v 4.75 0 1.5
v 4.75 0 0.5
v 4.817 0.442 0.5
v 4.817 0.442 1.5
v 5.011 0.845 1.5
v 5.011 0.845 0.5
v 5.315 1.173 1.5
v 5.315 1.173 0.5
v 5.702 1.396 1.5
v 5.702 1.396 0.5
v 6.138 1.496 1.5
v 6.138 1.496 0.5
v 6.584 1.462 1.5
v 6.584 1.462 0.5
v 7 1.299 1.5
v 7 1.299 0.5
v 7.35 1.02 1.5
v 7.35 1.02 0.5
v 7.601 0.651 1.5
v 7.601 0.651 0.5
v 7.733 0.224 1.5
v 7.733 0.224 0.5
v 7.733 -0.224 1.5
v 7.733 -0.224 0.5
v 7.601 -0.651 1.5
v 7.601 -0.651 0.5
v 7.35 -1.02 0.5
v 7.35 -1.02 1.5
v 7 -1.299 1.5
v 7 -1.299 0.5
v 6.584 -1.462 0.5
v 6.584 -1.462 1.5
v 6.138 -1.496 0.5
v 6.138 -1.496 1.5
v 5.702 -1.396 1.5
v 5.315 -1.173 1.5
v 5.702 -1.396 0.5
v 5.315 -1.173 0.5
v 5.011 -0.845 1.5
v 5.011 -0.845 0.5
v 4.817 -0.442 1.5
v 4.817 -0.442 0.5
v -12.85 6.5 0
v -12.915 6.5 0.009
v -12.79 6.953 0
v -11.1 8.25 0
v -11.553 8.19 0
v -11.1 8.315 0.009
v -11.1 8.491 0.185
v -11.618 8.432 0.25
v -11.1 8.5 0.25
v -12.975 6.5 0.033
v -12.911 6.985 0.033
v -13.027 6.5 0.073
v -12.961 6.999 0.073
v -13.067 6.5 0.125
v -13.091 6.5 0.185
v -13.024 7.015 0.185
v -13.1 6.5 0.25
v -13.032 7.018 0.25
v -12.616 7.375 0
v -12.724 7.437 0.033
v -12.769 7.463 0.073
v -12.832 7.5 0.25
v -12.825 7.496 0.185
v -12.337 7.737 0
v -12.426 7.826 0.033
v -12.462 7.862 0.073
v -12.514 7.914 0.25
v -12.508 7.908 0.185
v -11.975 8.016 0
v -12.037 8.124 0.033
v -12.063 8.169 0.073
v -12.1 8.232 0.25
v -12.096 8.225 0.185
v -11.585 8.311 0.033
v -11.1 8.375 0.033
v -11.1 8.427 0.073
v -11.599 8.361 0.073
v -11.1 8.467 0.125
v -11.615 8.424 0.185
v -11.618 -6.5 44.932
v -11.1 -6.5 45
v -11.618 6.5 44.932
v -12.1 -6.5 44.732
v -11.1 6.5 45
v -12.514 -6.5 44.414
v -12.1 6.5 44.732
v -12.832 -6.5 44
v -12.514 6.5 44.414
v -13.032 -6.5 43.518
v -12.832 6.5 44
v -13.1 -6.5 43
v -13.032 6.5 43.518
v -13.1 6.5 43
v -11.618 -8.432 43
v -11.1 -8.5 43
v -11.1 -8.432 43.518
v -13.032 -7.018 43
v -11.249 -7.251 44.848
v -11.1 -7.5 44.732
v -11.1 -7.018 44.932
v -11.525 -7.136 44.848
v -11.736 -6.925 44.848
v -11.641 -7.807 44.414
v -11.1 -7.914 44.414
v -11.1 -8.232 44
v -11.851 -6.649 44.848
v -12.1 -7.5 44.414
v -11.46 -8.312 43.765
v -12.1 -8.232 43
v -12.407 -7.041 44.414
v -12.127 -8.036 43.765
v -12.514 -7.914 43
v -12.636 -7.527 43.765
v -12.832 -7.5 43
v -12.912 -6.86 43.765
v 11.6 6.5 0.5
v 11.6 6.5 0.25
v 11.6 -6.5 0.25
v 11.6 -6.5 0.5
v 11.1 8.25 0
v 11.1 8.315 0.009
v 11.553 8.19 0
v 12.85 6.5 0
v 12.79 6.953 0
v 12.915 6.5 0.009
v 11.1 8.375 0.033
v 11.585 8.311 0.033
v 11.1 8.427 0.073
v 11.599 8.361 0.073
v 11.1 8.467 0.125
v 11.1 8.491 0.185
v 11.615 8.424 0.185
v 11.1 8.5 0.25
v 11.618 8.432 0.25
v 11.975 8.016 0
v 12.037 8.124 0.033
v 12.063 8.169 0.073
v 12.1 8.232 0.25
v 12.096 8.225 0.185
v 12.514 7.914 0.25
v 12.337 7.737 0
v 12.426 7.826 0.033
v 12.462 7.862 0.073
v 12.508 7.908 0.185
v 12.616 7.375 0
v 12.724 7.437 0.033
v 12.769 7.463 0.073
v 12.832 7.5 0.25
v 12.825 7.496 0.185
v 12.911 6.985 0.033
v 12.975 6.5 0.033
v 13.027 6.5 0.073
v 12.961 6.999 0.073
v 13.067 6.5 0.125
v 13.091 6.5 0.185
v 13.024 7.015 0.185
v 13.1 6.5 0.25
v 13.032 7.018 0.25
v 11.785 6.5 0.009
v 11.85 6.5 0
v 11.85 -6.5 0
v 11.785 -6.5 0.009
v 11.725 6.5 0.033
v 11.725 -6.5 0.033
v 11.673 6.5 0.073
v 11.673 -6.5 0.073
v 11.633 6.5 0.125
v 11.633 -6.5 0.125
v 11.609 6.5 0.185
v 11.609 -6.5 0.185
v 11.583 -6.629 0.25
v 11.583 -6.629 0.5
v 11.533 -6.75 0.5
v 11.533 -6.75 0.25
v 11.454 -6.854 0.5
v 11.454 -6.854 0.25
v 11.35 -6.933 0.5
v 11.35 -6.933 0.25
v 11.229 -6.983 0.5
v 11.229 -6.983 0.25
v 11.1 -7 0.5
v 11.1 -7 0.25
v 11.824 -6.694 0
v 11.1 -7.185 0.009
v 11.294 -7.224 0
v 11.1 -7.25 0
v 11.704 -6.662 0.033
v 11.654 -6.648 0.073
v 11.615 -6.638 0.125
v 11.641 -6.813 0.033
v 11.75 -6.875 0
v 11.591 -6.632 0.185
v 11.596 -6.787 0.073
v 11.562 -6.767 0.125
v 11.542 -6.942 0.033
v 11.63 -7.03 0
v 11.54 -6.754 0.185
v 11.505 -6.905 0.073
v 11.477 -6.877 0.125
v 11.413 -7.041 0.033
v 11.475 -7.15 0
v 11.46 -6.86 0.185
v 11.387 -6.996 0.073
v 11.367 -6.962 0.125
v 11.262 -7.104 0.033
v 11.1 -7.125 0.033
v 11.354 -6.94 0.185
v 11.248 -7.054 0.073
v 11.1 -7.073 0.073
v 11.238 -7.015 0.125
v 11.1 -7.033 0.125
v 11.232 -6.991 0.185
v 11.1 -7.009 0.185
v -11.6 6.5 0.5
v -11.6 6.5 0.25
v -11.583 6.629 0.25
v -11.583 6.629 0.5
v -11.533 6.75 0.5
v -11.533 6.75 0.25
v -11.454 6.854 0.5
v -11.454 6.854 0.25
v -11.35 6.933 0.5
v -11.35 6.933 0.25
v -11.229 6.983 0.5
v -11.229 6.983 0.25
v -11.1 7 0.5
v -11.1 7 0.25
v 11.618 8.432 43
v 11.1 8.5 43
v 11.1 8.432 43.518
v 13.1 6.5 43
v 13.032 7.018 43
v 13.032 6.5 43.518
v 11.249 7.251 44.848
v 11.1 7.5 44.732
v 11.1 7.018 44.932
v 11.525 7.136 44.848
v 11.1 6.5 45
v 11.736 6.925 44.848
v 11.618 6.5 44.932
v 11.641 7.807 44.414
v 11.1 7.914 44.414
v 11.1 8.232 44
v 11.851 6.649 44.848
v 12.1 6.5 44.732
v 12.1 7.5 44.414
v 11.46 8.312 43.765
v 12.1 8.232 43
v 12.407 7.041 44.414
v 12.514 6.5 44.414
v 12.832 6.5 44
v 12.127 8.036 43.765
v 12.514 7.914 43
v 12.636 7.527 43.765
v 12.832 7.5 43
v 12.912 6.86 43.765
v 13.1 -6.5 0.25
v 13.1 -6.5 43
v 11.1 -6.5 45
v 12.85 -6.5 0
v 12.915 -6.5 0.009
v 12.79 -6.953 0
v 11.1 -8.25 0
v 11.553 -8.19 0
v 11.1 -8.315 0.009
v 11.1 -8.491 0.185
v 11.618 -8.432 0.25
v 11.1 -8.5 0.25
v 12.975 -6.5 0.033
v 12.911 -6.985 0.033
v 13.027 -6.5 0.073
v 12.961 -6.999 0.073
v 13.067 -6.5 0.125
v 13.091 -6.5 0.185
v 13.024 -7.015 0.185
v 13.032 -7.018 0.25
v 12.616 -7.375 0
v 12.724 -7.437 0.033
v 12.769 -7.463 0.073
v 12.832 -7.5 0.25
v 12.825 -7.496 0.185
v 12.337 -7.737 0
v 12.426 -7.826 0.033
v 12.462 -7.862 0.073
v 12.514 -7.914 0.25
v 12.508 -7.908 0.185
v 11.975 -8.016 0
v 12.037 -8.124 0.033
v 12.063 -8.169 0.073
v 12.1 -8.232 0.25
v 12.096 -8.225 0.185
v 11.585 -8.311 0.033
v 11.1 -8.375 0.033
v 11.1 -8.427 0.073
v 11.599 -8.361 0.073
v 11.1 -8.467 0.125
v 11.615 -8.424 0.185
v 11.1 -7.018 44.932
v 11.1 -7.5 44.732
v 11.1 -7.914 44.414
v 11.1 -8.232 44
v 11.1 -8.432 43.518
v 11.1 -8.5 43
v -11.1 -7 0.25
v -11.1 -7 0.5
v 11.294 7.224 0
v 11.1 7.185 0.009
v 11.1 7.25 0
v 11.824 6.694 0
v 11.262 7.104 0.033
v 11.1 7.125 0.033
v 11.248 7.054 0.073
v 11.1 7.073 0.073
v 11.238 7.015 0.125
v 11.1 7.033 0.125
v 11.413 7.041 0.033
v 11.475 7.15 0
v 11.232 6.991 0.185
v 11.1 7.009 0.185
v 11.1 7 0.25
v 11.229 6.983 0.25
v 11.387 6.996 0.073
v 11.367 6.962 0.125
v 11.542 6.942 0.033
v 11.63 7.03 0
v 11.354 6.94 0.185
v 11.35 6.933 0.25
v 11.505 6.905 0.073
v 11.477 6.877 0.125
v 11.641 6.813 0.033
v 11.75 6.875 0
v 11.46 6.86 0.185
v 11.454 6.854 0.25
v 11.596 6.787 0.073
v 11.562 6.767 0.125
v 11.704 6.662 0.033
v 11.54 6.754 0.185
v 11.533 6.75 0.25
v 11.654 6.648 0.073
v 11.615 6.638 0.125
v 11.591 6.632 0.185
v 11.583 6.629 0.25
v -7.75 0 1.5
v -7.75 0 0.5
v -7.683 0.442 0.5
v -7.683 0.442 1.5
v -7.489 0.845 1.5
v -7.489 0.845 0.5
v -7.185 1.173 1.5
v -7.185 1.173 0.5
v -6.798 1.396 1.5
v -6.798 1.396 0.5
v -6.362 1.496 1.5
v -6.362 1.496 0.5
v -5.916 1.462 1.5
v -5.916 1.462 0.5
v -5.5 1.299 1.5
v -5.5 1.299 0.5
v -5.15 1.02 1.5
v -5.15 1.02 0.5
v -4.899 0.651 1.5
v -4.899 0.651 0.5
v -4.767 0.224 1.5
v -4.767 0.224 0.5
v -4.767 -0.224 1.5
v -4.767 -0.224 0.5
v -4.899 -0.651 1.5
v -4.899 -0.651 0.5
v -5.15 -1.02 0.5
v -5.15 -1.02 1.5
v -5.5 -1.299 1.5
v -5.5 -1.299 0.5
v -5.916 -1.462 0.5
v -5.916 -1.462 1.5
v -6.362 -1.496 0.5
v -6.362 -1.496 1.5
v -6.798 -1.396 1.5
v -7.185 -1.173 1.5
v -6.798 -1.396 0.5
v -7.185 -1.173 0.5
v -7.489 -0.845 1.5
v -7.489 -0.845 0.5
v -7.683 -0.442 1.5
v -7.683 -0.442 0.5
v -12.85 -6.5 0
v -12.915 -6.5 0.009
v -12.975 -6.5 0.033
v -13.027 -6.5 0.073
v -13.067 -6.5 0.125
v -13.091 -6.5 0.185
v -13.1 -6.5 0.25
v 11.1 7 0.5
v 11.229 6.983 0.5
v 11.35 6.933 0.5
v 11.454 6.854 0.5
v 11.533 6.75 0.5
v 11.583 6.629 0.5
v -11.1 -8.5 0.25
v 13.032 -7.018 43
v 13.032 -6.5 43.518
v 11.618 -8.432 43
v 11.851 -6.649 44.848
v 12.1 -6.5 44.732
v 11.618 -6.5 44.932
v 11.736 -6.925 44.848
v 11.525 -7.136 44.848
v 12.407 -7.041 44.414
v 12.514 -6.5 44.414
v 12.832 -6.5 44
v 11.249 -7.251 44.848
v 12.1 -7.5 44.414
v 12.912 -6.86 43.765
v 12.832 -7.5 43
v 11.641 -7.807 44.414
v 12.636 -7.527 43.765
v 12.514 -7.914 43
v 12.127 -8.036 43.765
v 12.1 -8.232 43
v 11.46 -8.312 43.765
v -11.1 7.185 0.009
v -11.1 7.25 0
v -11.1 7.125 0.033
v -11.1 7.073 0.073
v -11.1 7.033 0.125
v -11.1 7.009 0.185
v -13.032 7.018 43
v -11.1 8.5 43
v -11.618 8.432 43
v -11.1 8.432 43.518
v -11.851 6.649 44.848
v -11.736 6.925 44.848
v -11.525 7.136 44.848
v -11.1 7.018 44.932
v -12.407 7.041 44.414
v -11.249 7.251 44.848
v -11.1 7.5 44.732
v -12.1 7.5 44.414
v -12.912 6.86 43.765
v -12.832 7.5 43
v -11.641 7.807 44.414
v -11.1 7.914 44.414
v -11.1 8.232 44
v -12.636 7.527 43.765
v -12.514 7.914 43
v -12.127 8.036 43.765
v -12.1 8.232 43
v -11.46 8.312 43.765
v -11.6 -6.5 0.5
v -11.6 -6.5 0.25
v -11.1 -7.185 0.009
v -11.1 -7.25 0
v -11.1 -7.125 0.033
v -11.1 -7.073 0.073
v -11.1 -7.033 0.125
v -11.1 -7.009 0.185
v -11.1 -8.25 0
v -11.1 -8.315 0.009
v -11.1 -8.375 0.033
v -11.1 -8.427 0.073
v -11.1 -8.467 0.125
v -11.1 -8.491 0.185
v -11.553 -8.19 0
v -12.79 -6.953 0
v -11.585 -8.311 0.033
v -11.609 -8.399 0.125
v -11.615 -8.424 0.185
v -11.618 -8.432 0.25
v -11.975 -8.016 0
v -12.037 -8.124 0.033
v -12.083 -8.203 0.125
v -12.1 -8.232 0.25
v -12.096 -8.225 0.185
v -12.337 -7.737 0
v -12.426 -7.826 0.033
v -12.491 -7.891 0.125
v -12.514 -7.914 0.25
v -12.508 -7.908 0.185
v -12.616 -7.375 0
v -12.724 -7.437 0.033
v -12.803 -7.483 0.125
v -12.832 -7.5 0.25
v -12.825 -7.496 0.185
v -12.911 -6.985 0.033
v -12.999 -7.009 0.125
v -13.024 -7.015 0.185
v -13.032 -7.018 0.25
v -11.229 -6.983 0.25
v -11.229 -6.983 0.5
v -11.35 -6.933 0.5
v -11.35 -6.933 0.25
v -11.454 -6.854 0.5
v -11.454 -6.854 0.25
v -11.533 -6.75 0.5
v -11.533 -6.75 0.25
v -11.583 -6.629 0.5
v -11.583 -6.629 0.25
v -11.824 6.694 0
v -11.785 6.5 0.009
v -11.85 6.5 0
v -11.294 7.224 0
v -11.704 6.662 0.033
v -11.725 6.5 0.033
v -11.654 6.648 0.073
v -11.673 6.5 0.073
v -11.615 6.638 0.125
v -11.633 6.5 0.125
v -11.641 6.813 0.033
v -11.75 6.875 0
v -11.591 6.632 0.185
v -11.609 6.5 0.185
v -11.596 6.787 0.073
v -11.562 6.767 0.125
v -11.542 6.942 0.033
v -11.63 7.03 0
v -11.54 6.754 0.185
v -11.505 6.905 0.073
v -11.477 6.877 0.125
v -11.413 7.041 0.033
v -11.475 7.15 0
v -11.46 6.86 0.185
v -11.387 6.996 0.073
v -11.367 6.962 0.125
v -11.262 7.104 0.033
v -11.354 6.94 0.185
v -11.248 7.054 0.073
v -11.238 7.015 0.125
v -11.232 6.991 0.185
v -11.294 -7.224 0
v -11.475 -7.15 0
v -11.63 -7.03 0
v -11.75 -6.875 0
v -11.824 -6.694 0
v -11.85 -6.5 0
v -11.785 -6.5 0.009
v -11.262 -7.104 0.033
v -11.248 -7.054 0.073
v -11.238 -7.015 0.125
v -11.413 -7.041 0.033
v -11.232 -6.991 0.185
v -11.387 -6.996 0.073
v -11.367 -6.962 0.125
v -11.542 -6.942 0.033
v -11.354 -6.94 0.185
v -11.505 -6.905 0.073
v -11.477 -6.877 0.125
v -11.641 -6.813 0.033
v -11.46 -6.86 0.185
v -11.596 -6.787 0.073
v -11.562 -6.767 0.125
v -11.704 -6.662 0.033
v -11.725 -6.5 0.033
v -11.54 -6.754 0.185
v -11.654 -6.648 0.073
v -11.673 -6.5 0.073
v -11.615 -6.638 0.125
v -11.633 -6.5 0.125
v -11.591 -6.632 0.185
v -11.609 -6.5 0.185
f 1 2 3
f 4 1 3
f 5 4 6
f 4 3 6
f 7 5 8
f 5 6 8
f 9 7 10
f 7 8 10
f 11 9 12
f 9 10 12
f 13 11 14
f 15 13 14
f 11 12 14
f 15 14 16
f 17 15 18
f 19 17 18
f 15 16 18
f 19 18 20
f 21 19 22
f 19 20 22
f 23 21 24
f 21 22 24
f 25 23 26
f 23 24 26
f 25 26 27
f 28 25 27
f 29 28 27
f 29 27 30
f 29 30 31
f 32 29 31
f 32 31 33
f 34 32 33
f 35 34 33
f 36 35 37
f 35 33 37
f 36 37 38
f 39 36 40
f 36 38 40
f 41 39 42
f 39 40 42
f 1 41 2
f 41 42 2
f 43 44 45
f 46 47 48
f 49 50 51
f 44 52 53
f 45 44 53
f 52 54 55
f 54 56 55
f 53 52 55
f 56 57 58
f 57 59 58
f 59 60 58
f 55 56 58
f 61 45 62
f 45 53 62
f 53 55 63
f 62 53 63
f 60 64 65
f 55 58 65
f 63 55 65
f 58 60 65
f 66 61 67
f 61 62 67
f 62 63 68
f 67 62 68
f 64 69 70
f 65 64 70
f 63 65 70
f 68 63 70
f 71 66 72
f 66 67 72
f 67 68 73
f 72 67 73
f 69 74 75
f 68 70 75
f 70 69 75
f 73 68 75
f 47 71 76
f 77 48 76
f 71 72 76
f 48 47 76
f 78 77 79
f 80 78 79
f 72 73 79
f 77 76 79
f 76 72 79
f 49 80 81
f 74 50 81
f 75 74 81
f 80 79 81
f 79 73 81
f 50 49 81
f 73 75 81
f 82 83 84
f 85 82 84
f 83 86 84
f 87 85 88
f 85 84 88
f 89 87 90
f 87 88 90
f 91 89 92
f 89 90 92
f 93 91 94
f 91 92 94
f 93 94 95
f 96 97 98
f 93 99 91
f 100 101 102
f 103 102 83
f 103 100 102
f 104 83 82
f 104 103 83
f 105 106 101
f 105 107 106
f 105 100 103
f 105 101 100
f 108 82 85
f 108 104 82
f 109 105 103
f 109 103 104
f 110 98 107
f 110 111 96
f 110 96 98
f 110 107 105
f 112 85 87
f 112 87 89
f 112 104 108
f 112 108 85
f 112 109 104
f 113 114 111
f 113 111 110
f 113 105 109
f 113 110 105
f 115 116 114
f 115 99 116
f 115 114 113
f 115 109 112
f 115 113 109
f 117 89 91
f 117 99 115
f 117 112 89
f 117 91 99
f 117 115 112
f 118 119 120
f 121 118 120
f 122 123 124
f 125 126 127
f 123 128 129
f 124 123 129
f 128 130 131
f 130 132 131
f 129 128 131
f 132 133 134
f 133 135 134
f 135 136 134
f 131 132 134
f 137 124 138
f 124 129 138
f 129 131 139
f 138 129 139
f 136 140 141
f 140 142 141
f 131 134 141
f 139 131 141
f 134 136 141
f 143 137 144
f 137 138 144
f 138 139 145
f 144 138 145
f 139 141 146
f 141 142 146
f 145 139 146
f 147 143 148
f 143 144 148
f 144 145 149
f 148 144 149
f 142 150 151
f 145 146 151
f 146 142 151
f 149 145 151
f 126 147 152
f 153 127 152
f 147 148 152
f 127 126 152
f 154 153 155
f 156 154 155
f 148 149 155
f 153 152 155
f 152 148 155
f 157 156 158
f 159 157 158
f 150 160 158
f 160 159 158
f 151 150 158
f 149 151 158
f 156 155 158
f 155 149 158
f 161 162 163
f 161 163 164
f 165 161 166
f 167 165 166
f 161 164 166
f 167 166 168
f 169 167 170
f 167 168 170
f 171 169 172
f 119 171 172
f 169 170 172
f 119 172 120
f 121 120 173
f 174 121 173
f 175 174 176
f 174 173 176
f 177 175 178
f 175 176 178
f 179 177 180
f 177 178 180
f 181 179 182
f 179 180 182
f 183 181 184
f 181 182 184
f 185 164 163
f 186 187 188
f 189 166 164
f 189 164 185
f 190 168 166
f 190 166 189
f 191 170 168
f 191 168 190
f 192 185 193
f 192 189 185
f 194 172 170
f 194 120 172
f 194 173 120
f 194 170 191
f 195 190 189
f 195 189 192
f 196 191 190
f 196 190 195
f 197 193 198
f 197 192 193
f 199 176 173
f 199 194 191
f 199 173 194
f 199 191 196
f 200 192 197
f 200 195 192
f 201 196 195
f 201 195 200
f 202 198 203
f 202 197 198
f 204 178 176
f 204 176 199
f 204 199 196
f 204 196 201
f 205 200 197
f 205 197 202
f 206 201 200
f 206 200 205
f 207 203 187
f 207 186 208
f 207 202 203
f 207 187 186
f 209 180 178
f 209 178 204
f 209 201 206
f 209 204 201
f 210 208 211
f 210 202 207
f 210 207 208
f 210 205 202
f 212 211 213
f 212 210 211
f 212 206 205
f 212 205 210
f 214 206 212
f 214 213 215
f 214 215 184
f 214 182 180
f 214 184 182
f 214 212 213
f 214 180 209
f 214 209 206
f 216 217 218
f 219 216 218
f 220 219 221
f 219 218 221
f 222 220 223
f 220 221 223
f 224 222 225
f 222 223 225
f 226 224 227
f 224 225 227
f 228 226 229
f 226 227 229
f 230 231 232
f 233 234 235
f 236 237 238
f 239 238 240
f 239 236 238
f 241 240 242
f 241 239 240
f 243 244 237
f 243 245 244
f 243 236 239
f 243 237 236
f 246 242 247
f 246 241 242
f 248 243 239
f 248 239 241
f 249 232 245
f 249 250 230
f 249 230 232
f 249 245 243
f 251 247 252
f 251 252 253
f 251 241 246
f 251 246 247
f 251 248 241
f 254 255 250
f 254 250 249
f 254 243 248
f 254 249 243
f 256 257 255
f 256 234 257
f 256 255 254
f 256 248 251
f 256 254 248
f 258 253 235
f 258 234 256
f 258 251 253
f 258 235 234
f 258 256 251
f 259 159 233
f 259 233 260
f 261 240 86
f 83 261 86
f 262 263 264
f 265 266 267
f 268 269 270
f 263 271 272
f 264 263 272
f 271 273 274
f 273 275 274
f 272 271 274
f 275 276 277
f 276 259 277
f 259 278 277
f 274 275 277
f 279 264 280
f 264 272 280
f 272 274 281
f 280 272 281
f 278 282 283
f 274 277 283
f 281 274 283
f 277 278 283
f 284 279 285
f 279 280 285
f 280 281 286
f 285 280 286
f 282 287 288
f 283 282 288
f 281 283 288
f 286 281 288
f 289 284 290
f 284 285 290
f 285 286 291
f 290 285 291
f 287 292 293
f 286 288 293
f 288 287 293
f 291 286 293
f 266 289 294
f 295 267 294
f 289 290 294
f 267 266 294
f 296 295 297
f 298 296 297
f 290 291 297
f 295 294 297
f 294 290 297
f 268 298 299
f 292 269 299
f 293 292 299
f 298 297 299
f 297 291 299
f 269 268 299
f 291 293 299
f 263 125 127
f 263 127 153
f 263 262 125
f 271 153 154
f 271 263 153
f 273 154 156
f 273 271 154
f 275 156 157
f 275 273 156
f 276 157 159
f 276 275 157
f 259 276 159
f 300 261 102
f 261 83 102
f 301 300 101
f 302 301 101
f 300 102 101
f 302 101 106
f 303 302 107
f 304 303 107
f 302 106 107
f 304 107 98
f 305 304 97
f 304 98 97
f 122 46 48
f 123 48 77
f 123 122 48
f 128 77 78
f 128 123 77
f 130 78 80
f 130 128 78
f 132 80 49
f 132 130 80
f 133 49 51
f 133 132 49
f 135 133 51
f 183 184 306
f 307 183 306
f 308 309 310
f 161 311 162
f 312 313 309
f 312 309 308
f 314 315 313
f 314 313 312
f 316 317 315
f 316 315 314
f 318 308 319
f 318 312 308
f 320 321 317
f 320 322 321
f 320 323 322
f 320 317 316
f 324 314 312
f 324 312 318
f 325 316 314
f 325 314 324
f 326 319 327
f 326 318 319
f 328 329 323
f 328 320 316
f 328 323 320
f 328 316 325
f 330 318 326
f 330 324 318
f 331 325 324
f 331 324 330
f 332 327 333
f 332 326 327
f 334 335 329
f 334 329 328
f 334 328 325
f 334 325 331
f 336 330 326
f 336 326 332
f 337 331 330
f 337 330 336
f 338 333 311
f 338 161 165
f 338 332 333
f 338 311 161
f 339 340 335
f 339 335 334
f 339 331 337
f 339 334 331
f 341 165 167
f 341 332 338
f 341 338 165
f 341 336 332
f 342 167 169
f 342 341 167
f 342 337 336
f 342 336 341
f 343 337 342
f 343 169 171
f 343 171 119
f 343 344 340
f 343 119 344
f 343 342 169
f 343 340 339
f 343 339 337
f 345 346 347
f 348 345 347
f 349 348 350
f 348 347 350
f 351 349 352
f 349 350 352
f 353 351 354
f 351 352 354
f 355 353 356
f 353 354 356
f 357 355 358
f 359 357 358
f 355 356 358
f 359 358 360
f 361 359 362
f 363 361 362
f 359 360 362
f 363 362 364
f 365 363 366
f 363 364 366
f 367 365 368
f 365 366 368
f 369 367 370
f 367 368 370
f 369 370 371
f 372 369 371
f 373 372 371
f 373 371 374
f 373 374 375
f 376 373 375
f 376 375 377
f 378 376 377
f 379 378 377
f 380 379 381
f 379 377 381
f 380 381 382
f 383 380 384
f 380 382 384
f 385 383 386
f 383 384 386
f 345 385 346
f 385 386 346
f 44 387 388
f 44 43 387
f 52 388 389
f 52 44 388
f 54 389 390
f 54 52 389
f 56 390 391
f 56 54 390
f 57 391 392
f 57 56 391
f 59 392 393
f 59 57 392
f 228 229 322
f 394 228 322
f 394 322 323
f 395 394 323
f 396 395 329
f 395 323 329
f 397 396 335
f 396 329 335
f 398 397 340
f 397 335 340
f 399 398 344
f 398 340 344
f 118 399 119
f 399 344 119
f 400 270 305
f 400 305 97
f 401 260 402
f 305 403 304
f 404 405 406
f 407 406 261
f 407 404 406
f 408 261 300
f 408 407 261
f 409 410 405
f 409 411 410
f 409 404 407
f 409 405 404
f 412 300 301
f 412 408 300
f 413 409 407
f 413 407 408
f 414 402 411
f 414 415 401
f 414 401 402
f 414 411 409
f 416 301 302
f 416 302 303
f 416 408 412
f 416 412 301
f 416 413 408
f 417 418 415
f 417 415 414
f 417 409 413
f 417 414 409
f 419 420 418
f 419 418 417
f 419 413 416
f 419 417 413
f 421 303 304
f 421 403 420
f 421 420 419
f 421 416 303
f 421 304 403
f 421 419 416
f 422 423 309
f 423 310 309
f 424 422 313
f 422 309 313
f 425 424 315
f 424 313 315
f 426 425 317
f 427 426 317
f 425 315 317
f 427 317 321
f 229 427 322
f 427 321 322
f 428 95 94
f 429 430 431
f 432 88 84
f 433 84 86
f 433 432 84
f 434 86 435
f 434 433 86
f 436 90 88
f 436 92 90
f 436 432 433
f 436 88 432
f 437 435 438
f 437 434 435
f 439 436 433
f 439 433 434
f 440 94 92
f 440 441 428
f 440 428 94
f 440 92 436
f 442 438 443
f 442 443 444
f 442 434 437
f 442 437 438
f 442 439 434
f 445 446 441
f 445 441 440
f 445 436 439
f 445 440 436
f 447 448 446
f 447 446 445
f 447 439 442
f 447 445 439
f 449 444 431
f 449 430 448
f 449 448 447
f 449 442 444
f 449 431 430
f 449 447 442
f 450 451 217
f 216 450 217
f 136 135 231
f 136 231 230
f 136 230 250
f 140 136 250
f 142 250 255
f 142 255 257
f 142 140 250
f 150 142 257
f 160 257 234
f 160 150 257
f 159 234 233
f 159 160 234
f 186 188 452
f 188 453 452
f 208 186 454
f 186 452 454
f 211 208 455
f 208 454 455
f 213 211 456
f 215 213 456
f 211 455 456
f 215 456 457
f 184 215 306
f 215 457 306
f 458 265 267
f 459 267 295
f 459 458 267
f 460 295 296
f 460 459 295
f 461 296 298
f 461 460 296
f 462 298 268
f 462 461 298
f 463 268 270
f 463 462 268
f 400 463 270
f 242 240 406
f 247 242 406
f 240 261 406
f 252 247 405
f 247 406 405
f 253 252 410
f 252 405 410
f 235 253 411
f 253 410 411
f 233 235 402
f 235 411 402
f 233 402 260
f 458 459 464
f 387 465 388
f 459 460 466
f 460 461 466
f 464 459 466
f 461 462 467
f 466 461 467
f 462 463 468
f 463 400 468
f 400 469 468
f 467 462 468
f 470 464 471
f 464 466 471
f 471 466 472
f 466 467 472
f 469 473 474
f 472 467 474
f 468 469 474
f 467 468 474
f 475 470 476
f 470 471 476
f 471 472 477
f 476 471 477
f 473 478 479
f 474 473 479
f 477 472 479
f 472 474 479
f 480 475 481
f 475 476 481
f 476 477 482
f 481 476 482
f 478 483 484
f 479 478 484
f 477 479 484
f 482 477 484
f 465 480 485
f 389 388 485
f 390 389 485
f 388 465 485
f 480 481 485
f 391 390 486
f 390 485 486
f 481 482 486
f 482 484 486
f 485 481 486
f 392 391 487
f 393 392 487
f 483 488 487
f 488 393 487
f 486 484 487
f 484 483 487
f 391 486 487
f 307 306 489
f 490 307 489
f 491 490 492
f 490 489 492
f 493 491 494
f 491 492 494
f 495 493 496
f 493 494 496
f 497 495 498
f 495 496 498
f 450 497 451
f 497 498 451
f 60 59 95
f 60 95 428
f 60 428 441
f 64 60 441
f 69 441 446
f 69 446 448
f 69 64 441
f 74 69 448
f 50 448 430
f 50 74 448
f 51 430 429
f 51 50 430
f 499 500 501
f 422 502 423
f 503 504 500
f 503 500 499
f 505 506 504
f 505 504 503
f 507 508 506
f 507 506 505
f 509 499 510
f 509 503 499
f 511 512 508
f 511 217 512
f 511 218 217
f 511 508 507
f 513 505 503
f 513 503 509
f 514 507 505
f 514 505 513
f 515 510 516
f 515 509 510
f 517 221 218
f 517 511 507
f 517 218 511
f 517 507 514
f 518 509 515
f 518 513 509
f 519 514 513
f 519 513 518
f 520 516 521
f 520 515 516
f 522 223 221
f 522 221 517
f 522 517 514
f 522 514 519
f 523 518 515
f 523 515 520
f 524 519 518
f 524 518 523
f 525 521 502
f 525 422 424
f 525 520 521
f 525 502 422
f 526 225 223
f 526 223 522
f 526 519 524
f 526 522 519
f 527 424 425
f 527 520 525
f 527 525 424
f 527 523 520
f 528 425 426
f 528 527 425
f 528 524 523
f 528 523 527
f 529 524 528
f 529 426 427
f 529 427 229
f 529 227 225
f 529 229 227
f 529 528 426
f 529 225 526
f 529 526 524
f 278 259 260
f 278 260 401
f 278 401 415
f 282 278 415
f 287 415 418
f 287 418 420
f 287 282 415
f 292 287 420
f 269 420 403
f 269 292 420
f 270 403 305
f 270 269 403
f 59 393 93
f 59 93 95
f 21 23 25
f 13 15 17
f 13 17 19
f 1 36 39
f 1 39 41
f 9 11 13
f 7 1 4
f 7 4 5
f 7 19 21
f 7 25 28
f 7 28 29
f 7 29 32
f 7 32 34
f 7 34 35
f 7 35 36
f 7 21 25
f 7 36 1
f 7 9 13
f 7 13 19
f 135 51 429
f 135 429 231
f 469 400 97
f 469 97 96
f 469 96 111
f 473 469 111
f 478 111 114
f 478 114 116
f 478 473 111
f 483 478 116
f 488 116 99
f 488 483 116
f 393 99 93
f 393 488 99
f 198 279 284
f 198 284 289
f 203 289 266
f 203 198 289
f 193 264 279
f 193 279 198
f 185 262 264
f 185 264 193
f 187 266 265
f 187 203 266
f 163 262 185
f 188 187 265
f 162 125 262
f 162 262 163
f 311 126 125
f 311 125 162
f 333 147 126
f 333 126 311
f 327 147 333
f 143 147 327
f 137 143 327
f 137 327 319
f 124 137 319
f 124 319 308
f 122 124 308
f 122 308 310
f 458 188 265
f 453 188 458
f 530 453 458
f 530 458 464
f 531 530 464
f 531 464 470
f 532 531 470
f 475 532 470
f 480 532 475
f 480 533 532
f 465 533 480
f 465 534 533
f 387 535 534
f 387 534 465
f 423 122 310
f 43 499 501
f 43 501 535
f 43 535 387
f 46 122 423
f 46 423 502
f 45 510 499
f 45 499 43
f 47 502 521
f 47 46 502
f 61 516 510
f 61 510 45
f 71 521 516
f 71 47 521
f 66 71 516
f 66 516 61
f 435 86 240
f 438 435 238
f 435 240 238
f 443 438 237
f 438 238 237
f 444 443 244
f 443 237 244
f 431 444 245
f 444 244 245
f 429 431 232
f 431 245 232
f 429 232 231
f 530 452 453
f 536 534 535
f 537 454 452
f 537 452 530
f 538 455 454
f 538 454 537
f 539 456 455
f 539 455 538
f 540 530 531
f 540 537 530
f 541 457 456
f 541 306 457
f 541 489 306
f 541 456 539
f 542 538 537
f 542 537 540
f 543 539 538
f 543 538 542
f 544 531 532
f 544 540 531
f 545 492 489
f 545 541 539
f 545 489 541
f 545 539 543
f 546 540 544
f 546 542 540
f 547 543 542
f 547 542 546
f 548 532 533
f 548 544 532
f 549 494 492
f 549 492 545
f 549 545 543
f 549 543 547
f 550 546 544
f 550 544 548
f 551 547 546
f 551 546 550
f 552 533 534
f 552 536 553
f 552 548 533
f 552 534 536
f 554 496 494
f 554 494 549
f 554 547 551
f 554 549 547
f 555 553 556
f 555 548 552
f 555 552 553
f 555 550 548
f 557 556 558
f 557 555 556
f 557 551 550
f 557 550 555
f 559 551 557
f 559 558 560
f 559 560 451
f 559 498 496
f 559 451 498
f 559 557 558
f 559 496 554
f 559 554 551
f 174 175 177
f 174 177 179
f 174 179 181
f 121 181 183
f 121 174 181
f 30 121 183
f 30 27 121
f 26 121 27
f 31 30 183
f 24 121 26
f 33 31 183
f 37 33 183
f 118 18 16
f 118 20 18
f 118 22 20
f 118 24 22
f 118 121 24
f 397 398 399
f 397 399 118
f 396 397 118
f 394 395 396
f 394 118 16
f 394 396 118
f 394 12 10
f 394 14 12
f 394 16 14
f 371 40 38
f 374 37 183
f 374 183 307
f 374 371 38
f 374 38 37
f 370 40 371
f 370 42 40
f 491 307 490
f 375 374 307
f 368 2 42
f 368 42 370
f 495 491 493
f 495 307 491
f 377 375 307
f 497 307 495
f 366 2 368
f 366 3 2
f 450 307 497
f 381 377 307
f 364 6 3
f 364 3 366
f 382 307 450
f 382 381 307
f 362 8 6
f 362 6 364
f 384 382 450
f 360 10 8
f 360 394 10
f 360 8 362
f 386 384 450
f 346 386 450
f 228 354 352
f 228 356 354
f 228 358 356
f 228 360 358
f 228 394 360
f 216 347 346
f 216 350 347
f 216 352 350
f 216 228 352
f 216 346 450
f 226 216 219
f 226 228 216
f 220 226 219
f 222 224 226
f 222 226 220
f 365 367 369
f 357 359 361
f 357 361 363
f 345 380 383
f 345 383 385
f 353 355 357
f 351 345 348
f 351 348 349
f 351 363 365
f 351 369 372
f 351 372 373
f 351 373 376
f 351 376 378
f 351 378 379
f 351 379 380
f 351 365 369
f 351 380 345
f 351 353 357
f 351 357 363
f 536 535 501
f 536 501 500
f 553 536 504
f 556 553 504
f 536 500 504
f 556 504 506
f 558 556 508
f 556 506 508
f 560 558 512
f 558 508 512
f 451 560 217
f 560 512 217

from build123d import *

# Parameters (mm, degrees)
BOSS_EXTRU_1_DEPTH      = 45
ENL_V_MAT_EXTRU_1_DEPTH = 0.5
CONG_1_R                = 0.25
CONG_2_R                = 2
ESQUISSE3_R             = 1.5
ENL_V_MAT_EXTRU_2_DEPTH = 1


with BuildPart() as part:
    # Esquisse1 → Boss.-Extru.1 (new body)
    with BuildSketch(Plane.XY):
        with BuildLine():
            Line((-11.1, 8.5), (11.1, 8.5))
            ThreePointArc((11.1, 8.5), (12.514213562, 7.914213562), (13.1, 6.5))
            Line((13.1, 6.5), (13.1, -6.5))
            ThreePointArc((13.1, -6.5), (12.514213562, -7.914213562), (11.1, -8.5))
            Line((11.1, -8.5), (-11.1, -8.5))
            ThreePointArc((-11.1, -8.5), (-12.514213562, -7.914213562), (-13.1, -6.5))
            Line((-13.1, -6.5), (-13.1, 6.5))
            ThreePointArc((-13.1, 6.5), (-12.514213562, 7.914213562), (-11.1, 8.5))
        make_face()
    extrude(amount=BOSS_EXTRU_1_DEPTH)

    # Esquisse2 → Enlèv. mat.-Extru.1 (cut)
    with BuildSketch(Plane(origin=(0, 0, 0), x_dir=(-1, 0, 0), z_dir=(0, 0, -1))):
        with BuildLine():
            Line((11.6, -6.5), (11.6, 6.5))
            ThreePointArc((11.6, 6.5), (11.453553391, 6.853553391), (11.1, 7))
            Line((11.1, 7), (-11.1, 7))
            ThreePointArc((-11.1, 7), (-11.453553391, 6.853553391), (-11.6, 6.5))
            Line((-11.6, 6.5), (-11.6, -6.5))
            ThreePointArc((-11.6, -6.5), (-11.453553391, -6.853553391), (-11.1, -7))
            Line((-11.1, -7), (11.1, -7))
            ThreePointArc((11.1, -7), (11.453553391, -6.853553391), (11.6, -6.5))
        make_face()
    extrude(amount=-ENL_V_MAT_EXTRU_1_DEPTH, mode=Mode.SUBTRACT)

    # Congé1
    cong_1_edges = [part.edges().sort_by_distance(p)[0] for p in [
        (-13.1, 0, 0),
        (-12.514213562, 7.914213562, 0),
        (-11.453553391, 6.853553391, 0),
        (0, 7, 0),
        (11.453553391, 6.853553391, 0),
        (11.6, 0, 0),
        (11.453553391, -6.853553391, 0),
        (0, -7, 0),
        (-11.453553391, -6.853553391, 0),
        (-11.6, 0, 0),
        (0, 8.5, 0),
        (12.514213562, 7.914213562, 0),
        (13.1, 0, 0),
        (12.514213562, -7.914213562, 0),
        (0, -8.5, 0),
        (-12.514213562, -7.914213562, 0),
    ]]
    fillet(cong_1_edges, radius=CONG_1_R)

    # Congé2
    cong_2_edges = [part.edges().sort_by_distance(p)[0] for p in [
        (-12.514213562, -7.914213562, 45),
        (0, -8.5, 45),
        (12.514213562, -7.914213562, 45),
        (13.1, 0, 45),
        (12.514213562, 7.914213562, 45),
        (0, 8.5, 45),
        (-12.514213562, 7.914213562, 45),
        (-13.1, 0, 45),
    ]]
    fillet(cong_2_edges, radius=CONG_2_R)

    # Esquisse3 → Enlèv. mat.-Extru.2 (cut)
    with BuildSketch(Plane(origin=(0, 0, 0.5), x_dir=(-1, 0, 0), z_dir=(0, 0, -1))):
        with Locations((-6.25, 0)):
            Circle(ESQUISSE3_R)
        with Locations((6.25, 0)):
            Circle(ESQUISSE3_R)
    extrude(amount=-ENL_V_MAT_EXTRU_2_DEPTH, mode=Mode.SUBTRACT)


solid = part.part
